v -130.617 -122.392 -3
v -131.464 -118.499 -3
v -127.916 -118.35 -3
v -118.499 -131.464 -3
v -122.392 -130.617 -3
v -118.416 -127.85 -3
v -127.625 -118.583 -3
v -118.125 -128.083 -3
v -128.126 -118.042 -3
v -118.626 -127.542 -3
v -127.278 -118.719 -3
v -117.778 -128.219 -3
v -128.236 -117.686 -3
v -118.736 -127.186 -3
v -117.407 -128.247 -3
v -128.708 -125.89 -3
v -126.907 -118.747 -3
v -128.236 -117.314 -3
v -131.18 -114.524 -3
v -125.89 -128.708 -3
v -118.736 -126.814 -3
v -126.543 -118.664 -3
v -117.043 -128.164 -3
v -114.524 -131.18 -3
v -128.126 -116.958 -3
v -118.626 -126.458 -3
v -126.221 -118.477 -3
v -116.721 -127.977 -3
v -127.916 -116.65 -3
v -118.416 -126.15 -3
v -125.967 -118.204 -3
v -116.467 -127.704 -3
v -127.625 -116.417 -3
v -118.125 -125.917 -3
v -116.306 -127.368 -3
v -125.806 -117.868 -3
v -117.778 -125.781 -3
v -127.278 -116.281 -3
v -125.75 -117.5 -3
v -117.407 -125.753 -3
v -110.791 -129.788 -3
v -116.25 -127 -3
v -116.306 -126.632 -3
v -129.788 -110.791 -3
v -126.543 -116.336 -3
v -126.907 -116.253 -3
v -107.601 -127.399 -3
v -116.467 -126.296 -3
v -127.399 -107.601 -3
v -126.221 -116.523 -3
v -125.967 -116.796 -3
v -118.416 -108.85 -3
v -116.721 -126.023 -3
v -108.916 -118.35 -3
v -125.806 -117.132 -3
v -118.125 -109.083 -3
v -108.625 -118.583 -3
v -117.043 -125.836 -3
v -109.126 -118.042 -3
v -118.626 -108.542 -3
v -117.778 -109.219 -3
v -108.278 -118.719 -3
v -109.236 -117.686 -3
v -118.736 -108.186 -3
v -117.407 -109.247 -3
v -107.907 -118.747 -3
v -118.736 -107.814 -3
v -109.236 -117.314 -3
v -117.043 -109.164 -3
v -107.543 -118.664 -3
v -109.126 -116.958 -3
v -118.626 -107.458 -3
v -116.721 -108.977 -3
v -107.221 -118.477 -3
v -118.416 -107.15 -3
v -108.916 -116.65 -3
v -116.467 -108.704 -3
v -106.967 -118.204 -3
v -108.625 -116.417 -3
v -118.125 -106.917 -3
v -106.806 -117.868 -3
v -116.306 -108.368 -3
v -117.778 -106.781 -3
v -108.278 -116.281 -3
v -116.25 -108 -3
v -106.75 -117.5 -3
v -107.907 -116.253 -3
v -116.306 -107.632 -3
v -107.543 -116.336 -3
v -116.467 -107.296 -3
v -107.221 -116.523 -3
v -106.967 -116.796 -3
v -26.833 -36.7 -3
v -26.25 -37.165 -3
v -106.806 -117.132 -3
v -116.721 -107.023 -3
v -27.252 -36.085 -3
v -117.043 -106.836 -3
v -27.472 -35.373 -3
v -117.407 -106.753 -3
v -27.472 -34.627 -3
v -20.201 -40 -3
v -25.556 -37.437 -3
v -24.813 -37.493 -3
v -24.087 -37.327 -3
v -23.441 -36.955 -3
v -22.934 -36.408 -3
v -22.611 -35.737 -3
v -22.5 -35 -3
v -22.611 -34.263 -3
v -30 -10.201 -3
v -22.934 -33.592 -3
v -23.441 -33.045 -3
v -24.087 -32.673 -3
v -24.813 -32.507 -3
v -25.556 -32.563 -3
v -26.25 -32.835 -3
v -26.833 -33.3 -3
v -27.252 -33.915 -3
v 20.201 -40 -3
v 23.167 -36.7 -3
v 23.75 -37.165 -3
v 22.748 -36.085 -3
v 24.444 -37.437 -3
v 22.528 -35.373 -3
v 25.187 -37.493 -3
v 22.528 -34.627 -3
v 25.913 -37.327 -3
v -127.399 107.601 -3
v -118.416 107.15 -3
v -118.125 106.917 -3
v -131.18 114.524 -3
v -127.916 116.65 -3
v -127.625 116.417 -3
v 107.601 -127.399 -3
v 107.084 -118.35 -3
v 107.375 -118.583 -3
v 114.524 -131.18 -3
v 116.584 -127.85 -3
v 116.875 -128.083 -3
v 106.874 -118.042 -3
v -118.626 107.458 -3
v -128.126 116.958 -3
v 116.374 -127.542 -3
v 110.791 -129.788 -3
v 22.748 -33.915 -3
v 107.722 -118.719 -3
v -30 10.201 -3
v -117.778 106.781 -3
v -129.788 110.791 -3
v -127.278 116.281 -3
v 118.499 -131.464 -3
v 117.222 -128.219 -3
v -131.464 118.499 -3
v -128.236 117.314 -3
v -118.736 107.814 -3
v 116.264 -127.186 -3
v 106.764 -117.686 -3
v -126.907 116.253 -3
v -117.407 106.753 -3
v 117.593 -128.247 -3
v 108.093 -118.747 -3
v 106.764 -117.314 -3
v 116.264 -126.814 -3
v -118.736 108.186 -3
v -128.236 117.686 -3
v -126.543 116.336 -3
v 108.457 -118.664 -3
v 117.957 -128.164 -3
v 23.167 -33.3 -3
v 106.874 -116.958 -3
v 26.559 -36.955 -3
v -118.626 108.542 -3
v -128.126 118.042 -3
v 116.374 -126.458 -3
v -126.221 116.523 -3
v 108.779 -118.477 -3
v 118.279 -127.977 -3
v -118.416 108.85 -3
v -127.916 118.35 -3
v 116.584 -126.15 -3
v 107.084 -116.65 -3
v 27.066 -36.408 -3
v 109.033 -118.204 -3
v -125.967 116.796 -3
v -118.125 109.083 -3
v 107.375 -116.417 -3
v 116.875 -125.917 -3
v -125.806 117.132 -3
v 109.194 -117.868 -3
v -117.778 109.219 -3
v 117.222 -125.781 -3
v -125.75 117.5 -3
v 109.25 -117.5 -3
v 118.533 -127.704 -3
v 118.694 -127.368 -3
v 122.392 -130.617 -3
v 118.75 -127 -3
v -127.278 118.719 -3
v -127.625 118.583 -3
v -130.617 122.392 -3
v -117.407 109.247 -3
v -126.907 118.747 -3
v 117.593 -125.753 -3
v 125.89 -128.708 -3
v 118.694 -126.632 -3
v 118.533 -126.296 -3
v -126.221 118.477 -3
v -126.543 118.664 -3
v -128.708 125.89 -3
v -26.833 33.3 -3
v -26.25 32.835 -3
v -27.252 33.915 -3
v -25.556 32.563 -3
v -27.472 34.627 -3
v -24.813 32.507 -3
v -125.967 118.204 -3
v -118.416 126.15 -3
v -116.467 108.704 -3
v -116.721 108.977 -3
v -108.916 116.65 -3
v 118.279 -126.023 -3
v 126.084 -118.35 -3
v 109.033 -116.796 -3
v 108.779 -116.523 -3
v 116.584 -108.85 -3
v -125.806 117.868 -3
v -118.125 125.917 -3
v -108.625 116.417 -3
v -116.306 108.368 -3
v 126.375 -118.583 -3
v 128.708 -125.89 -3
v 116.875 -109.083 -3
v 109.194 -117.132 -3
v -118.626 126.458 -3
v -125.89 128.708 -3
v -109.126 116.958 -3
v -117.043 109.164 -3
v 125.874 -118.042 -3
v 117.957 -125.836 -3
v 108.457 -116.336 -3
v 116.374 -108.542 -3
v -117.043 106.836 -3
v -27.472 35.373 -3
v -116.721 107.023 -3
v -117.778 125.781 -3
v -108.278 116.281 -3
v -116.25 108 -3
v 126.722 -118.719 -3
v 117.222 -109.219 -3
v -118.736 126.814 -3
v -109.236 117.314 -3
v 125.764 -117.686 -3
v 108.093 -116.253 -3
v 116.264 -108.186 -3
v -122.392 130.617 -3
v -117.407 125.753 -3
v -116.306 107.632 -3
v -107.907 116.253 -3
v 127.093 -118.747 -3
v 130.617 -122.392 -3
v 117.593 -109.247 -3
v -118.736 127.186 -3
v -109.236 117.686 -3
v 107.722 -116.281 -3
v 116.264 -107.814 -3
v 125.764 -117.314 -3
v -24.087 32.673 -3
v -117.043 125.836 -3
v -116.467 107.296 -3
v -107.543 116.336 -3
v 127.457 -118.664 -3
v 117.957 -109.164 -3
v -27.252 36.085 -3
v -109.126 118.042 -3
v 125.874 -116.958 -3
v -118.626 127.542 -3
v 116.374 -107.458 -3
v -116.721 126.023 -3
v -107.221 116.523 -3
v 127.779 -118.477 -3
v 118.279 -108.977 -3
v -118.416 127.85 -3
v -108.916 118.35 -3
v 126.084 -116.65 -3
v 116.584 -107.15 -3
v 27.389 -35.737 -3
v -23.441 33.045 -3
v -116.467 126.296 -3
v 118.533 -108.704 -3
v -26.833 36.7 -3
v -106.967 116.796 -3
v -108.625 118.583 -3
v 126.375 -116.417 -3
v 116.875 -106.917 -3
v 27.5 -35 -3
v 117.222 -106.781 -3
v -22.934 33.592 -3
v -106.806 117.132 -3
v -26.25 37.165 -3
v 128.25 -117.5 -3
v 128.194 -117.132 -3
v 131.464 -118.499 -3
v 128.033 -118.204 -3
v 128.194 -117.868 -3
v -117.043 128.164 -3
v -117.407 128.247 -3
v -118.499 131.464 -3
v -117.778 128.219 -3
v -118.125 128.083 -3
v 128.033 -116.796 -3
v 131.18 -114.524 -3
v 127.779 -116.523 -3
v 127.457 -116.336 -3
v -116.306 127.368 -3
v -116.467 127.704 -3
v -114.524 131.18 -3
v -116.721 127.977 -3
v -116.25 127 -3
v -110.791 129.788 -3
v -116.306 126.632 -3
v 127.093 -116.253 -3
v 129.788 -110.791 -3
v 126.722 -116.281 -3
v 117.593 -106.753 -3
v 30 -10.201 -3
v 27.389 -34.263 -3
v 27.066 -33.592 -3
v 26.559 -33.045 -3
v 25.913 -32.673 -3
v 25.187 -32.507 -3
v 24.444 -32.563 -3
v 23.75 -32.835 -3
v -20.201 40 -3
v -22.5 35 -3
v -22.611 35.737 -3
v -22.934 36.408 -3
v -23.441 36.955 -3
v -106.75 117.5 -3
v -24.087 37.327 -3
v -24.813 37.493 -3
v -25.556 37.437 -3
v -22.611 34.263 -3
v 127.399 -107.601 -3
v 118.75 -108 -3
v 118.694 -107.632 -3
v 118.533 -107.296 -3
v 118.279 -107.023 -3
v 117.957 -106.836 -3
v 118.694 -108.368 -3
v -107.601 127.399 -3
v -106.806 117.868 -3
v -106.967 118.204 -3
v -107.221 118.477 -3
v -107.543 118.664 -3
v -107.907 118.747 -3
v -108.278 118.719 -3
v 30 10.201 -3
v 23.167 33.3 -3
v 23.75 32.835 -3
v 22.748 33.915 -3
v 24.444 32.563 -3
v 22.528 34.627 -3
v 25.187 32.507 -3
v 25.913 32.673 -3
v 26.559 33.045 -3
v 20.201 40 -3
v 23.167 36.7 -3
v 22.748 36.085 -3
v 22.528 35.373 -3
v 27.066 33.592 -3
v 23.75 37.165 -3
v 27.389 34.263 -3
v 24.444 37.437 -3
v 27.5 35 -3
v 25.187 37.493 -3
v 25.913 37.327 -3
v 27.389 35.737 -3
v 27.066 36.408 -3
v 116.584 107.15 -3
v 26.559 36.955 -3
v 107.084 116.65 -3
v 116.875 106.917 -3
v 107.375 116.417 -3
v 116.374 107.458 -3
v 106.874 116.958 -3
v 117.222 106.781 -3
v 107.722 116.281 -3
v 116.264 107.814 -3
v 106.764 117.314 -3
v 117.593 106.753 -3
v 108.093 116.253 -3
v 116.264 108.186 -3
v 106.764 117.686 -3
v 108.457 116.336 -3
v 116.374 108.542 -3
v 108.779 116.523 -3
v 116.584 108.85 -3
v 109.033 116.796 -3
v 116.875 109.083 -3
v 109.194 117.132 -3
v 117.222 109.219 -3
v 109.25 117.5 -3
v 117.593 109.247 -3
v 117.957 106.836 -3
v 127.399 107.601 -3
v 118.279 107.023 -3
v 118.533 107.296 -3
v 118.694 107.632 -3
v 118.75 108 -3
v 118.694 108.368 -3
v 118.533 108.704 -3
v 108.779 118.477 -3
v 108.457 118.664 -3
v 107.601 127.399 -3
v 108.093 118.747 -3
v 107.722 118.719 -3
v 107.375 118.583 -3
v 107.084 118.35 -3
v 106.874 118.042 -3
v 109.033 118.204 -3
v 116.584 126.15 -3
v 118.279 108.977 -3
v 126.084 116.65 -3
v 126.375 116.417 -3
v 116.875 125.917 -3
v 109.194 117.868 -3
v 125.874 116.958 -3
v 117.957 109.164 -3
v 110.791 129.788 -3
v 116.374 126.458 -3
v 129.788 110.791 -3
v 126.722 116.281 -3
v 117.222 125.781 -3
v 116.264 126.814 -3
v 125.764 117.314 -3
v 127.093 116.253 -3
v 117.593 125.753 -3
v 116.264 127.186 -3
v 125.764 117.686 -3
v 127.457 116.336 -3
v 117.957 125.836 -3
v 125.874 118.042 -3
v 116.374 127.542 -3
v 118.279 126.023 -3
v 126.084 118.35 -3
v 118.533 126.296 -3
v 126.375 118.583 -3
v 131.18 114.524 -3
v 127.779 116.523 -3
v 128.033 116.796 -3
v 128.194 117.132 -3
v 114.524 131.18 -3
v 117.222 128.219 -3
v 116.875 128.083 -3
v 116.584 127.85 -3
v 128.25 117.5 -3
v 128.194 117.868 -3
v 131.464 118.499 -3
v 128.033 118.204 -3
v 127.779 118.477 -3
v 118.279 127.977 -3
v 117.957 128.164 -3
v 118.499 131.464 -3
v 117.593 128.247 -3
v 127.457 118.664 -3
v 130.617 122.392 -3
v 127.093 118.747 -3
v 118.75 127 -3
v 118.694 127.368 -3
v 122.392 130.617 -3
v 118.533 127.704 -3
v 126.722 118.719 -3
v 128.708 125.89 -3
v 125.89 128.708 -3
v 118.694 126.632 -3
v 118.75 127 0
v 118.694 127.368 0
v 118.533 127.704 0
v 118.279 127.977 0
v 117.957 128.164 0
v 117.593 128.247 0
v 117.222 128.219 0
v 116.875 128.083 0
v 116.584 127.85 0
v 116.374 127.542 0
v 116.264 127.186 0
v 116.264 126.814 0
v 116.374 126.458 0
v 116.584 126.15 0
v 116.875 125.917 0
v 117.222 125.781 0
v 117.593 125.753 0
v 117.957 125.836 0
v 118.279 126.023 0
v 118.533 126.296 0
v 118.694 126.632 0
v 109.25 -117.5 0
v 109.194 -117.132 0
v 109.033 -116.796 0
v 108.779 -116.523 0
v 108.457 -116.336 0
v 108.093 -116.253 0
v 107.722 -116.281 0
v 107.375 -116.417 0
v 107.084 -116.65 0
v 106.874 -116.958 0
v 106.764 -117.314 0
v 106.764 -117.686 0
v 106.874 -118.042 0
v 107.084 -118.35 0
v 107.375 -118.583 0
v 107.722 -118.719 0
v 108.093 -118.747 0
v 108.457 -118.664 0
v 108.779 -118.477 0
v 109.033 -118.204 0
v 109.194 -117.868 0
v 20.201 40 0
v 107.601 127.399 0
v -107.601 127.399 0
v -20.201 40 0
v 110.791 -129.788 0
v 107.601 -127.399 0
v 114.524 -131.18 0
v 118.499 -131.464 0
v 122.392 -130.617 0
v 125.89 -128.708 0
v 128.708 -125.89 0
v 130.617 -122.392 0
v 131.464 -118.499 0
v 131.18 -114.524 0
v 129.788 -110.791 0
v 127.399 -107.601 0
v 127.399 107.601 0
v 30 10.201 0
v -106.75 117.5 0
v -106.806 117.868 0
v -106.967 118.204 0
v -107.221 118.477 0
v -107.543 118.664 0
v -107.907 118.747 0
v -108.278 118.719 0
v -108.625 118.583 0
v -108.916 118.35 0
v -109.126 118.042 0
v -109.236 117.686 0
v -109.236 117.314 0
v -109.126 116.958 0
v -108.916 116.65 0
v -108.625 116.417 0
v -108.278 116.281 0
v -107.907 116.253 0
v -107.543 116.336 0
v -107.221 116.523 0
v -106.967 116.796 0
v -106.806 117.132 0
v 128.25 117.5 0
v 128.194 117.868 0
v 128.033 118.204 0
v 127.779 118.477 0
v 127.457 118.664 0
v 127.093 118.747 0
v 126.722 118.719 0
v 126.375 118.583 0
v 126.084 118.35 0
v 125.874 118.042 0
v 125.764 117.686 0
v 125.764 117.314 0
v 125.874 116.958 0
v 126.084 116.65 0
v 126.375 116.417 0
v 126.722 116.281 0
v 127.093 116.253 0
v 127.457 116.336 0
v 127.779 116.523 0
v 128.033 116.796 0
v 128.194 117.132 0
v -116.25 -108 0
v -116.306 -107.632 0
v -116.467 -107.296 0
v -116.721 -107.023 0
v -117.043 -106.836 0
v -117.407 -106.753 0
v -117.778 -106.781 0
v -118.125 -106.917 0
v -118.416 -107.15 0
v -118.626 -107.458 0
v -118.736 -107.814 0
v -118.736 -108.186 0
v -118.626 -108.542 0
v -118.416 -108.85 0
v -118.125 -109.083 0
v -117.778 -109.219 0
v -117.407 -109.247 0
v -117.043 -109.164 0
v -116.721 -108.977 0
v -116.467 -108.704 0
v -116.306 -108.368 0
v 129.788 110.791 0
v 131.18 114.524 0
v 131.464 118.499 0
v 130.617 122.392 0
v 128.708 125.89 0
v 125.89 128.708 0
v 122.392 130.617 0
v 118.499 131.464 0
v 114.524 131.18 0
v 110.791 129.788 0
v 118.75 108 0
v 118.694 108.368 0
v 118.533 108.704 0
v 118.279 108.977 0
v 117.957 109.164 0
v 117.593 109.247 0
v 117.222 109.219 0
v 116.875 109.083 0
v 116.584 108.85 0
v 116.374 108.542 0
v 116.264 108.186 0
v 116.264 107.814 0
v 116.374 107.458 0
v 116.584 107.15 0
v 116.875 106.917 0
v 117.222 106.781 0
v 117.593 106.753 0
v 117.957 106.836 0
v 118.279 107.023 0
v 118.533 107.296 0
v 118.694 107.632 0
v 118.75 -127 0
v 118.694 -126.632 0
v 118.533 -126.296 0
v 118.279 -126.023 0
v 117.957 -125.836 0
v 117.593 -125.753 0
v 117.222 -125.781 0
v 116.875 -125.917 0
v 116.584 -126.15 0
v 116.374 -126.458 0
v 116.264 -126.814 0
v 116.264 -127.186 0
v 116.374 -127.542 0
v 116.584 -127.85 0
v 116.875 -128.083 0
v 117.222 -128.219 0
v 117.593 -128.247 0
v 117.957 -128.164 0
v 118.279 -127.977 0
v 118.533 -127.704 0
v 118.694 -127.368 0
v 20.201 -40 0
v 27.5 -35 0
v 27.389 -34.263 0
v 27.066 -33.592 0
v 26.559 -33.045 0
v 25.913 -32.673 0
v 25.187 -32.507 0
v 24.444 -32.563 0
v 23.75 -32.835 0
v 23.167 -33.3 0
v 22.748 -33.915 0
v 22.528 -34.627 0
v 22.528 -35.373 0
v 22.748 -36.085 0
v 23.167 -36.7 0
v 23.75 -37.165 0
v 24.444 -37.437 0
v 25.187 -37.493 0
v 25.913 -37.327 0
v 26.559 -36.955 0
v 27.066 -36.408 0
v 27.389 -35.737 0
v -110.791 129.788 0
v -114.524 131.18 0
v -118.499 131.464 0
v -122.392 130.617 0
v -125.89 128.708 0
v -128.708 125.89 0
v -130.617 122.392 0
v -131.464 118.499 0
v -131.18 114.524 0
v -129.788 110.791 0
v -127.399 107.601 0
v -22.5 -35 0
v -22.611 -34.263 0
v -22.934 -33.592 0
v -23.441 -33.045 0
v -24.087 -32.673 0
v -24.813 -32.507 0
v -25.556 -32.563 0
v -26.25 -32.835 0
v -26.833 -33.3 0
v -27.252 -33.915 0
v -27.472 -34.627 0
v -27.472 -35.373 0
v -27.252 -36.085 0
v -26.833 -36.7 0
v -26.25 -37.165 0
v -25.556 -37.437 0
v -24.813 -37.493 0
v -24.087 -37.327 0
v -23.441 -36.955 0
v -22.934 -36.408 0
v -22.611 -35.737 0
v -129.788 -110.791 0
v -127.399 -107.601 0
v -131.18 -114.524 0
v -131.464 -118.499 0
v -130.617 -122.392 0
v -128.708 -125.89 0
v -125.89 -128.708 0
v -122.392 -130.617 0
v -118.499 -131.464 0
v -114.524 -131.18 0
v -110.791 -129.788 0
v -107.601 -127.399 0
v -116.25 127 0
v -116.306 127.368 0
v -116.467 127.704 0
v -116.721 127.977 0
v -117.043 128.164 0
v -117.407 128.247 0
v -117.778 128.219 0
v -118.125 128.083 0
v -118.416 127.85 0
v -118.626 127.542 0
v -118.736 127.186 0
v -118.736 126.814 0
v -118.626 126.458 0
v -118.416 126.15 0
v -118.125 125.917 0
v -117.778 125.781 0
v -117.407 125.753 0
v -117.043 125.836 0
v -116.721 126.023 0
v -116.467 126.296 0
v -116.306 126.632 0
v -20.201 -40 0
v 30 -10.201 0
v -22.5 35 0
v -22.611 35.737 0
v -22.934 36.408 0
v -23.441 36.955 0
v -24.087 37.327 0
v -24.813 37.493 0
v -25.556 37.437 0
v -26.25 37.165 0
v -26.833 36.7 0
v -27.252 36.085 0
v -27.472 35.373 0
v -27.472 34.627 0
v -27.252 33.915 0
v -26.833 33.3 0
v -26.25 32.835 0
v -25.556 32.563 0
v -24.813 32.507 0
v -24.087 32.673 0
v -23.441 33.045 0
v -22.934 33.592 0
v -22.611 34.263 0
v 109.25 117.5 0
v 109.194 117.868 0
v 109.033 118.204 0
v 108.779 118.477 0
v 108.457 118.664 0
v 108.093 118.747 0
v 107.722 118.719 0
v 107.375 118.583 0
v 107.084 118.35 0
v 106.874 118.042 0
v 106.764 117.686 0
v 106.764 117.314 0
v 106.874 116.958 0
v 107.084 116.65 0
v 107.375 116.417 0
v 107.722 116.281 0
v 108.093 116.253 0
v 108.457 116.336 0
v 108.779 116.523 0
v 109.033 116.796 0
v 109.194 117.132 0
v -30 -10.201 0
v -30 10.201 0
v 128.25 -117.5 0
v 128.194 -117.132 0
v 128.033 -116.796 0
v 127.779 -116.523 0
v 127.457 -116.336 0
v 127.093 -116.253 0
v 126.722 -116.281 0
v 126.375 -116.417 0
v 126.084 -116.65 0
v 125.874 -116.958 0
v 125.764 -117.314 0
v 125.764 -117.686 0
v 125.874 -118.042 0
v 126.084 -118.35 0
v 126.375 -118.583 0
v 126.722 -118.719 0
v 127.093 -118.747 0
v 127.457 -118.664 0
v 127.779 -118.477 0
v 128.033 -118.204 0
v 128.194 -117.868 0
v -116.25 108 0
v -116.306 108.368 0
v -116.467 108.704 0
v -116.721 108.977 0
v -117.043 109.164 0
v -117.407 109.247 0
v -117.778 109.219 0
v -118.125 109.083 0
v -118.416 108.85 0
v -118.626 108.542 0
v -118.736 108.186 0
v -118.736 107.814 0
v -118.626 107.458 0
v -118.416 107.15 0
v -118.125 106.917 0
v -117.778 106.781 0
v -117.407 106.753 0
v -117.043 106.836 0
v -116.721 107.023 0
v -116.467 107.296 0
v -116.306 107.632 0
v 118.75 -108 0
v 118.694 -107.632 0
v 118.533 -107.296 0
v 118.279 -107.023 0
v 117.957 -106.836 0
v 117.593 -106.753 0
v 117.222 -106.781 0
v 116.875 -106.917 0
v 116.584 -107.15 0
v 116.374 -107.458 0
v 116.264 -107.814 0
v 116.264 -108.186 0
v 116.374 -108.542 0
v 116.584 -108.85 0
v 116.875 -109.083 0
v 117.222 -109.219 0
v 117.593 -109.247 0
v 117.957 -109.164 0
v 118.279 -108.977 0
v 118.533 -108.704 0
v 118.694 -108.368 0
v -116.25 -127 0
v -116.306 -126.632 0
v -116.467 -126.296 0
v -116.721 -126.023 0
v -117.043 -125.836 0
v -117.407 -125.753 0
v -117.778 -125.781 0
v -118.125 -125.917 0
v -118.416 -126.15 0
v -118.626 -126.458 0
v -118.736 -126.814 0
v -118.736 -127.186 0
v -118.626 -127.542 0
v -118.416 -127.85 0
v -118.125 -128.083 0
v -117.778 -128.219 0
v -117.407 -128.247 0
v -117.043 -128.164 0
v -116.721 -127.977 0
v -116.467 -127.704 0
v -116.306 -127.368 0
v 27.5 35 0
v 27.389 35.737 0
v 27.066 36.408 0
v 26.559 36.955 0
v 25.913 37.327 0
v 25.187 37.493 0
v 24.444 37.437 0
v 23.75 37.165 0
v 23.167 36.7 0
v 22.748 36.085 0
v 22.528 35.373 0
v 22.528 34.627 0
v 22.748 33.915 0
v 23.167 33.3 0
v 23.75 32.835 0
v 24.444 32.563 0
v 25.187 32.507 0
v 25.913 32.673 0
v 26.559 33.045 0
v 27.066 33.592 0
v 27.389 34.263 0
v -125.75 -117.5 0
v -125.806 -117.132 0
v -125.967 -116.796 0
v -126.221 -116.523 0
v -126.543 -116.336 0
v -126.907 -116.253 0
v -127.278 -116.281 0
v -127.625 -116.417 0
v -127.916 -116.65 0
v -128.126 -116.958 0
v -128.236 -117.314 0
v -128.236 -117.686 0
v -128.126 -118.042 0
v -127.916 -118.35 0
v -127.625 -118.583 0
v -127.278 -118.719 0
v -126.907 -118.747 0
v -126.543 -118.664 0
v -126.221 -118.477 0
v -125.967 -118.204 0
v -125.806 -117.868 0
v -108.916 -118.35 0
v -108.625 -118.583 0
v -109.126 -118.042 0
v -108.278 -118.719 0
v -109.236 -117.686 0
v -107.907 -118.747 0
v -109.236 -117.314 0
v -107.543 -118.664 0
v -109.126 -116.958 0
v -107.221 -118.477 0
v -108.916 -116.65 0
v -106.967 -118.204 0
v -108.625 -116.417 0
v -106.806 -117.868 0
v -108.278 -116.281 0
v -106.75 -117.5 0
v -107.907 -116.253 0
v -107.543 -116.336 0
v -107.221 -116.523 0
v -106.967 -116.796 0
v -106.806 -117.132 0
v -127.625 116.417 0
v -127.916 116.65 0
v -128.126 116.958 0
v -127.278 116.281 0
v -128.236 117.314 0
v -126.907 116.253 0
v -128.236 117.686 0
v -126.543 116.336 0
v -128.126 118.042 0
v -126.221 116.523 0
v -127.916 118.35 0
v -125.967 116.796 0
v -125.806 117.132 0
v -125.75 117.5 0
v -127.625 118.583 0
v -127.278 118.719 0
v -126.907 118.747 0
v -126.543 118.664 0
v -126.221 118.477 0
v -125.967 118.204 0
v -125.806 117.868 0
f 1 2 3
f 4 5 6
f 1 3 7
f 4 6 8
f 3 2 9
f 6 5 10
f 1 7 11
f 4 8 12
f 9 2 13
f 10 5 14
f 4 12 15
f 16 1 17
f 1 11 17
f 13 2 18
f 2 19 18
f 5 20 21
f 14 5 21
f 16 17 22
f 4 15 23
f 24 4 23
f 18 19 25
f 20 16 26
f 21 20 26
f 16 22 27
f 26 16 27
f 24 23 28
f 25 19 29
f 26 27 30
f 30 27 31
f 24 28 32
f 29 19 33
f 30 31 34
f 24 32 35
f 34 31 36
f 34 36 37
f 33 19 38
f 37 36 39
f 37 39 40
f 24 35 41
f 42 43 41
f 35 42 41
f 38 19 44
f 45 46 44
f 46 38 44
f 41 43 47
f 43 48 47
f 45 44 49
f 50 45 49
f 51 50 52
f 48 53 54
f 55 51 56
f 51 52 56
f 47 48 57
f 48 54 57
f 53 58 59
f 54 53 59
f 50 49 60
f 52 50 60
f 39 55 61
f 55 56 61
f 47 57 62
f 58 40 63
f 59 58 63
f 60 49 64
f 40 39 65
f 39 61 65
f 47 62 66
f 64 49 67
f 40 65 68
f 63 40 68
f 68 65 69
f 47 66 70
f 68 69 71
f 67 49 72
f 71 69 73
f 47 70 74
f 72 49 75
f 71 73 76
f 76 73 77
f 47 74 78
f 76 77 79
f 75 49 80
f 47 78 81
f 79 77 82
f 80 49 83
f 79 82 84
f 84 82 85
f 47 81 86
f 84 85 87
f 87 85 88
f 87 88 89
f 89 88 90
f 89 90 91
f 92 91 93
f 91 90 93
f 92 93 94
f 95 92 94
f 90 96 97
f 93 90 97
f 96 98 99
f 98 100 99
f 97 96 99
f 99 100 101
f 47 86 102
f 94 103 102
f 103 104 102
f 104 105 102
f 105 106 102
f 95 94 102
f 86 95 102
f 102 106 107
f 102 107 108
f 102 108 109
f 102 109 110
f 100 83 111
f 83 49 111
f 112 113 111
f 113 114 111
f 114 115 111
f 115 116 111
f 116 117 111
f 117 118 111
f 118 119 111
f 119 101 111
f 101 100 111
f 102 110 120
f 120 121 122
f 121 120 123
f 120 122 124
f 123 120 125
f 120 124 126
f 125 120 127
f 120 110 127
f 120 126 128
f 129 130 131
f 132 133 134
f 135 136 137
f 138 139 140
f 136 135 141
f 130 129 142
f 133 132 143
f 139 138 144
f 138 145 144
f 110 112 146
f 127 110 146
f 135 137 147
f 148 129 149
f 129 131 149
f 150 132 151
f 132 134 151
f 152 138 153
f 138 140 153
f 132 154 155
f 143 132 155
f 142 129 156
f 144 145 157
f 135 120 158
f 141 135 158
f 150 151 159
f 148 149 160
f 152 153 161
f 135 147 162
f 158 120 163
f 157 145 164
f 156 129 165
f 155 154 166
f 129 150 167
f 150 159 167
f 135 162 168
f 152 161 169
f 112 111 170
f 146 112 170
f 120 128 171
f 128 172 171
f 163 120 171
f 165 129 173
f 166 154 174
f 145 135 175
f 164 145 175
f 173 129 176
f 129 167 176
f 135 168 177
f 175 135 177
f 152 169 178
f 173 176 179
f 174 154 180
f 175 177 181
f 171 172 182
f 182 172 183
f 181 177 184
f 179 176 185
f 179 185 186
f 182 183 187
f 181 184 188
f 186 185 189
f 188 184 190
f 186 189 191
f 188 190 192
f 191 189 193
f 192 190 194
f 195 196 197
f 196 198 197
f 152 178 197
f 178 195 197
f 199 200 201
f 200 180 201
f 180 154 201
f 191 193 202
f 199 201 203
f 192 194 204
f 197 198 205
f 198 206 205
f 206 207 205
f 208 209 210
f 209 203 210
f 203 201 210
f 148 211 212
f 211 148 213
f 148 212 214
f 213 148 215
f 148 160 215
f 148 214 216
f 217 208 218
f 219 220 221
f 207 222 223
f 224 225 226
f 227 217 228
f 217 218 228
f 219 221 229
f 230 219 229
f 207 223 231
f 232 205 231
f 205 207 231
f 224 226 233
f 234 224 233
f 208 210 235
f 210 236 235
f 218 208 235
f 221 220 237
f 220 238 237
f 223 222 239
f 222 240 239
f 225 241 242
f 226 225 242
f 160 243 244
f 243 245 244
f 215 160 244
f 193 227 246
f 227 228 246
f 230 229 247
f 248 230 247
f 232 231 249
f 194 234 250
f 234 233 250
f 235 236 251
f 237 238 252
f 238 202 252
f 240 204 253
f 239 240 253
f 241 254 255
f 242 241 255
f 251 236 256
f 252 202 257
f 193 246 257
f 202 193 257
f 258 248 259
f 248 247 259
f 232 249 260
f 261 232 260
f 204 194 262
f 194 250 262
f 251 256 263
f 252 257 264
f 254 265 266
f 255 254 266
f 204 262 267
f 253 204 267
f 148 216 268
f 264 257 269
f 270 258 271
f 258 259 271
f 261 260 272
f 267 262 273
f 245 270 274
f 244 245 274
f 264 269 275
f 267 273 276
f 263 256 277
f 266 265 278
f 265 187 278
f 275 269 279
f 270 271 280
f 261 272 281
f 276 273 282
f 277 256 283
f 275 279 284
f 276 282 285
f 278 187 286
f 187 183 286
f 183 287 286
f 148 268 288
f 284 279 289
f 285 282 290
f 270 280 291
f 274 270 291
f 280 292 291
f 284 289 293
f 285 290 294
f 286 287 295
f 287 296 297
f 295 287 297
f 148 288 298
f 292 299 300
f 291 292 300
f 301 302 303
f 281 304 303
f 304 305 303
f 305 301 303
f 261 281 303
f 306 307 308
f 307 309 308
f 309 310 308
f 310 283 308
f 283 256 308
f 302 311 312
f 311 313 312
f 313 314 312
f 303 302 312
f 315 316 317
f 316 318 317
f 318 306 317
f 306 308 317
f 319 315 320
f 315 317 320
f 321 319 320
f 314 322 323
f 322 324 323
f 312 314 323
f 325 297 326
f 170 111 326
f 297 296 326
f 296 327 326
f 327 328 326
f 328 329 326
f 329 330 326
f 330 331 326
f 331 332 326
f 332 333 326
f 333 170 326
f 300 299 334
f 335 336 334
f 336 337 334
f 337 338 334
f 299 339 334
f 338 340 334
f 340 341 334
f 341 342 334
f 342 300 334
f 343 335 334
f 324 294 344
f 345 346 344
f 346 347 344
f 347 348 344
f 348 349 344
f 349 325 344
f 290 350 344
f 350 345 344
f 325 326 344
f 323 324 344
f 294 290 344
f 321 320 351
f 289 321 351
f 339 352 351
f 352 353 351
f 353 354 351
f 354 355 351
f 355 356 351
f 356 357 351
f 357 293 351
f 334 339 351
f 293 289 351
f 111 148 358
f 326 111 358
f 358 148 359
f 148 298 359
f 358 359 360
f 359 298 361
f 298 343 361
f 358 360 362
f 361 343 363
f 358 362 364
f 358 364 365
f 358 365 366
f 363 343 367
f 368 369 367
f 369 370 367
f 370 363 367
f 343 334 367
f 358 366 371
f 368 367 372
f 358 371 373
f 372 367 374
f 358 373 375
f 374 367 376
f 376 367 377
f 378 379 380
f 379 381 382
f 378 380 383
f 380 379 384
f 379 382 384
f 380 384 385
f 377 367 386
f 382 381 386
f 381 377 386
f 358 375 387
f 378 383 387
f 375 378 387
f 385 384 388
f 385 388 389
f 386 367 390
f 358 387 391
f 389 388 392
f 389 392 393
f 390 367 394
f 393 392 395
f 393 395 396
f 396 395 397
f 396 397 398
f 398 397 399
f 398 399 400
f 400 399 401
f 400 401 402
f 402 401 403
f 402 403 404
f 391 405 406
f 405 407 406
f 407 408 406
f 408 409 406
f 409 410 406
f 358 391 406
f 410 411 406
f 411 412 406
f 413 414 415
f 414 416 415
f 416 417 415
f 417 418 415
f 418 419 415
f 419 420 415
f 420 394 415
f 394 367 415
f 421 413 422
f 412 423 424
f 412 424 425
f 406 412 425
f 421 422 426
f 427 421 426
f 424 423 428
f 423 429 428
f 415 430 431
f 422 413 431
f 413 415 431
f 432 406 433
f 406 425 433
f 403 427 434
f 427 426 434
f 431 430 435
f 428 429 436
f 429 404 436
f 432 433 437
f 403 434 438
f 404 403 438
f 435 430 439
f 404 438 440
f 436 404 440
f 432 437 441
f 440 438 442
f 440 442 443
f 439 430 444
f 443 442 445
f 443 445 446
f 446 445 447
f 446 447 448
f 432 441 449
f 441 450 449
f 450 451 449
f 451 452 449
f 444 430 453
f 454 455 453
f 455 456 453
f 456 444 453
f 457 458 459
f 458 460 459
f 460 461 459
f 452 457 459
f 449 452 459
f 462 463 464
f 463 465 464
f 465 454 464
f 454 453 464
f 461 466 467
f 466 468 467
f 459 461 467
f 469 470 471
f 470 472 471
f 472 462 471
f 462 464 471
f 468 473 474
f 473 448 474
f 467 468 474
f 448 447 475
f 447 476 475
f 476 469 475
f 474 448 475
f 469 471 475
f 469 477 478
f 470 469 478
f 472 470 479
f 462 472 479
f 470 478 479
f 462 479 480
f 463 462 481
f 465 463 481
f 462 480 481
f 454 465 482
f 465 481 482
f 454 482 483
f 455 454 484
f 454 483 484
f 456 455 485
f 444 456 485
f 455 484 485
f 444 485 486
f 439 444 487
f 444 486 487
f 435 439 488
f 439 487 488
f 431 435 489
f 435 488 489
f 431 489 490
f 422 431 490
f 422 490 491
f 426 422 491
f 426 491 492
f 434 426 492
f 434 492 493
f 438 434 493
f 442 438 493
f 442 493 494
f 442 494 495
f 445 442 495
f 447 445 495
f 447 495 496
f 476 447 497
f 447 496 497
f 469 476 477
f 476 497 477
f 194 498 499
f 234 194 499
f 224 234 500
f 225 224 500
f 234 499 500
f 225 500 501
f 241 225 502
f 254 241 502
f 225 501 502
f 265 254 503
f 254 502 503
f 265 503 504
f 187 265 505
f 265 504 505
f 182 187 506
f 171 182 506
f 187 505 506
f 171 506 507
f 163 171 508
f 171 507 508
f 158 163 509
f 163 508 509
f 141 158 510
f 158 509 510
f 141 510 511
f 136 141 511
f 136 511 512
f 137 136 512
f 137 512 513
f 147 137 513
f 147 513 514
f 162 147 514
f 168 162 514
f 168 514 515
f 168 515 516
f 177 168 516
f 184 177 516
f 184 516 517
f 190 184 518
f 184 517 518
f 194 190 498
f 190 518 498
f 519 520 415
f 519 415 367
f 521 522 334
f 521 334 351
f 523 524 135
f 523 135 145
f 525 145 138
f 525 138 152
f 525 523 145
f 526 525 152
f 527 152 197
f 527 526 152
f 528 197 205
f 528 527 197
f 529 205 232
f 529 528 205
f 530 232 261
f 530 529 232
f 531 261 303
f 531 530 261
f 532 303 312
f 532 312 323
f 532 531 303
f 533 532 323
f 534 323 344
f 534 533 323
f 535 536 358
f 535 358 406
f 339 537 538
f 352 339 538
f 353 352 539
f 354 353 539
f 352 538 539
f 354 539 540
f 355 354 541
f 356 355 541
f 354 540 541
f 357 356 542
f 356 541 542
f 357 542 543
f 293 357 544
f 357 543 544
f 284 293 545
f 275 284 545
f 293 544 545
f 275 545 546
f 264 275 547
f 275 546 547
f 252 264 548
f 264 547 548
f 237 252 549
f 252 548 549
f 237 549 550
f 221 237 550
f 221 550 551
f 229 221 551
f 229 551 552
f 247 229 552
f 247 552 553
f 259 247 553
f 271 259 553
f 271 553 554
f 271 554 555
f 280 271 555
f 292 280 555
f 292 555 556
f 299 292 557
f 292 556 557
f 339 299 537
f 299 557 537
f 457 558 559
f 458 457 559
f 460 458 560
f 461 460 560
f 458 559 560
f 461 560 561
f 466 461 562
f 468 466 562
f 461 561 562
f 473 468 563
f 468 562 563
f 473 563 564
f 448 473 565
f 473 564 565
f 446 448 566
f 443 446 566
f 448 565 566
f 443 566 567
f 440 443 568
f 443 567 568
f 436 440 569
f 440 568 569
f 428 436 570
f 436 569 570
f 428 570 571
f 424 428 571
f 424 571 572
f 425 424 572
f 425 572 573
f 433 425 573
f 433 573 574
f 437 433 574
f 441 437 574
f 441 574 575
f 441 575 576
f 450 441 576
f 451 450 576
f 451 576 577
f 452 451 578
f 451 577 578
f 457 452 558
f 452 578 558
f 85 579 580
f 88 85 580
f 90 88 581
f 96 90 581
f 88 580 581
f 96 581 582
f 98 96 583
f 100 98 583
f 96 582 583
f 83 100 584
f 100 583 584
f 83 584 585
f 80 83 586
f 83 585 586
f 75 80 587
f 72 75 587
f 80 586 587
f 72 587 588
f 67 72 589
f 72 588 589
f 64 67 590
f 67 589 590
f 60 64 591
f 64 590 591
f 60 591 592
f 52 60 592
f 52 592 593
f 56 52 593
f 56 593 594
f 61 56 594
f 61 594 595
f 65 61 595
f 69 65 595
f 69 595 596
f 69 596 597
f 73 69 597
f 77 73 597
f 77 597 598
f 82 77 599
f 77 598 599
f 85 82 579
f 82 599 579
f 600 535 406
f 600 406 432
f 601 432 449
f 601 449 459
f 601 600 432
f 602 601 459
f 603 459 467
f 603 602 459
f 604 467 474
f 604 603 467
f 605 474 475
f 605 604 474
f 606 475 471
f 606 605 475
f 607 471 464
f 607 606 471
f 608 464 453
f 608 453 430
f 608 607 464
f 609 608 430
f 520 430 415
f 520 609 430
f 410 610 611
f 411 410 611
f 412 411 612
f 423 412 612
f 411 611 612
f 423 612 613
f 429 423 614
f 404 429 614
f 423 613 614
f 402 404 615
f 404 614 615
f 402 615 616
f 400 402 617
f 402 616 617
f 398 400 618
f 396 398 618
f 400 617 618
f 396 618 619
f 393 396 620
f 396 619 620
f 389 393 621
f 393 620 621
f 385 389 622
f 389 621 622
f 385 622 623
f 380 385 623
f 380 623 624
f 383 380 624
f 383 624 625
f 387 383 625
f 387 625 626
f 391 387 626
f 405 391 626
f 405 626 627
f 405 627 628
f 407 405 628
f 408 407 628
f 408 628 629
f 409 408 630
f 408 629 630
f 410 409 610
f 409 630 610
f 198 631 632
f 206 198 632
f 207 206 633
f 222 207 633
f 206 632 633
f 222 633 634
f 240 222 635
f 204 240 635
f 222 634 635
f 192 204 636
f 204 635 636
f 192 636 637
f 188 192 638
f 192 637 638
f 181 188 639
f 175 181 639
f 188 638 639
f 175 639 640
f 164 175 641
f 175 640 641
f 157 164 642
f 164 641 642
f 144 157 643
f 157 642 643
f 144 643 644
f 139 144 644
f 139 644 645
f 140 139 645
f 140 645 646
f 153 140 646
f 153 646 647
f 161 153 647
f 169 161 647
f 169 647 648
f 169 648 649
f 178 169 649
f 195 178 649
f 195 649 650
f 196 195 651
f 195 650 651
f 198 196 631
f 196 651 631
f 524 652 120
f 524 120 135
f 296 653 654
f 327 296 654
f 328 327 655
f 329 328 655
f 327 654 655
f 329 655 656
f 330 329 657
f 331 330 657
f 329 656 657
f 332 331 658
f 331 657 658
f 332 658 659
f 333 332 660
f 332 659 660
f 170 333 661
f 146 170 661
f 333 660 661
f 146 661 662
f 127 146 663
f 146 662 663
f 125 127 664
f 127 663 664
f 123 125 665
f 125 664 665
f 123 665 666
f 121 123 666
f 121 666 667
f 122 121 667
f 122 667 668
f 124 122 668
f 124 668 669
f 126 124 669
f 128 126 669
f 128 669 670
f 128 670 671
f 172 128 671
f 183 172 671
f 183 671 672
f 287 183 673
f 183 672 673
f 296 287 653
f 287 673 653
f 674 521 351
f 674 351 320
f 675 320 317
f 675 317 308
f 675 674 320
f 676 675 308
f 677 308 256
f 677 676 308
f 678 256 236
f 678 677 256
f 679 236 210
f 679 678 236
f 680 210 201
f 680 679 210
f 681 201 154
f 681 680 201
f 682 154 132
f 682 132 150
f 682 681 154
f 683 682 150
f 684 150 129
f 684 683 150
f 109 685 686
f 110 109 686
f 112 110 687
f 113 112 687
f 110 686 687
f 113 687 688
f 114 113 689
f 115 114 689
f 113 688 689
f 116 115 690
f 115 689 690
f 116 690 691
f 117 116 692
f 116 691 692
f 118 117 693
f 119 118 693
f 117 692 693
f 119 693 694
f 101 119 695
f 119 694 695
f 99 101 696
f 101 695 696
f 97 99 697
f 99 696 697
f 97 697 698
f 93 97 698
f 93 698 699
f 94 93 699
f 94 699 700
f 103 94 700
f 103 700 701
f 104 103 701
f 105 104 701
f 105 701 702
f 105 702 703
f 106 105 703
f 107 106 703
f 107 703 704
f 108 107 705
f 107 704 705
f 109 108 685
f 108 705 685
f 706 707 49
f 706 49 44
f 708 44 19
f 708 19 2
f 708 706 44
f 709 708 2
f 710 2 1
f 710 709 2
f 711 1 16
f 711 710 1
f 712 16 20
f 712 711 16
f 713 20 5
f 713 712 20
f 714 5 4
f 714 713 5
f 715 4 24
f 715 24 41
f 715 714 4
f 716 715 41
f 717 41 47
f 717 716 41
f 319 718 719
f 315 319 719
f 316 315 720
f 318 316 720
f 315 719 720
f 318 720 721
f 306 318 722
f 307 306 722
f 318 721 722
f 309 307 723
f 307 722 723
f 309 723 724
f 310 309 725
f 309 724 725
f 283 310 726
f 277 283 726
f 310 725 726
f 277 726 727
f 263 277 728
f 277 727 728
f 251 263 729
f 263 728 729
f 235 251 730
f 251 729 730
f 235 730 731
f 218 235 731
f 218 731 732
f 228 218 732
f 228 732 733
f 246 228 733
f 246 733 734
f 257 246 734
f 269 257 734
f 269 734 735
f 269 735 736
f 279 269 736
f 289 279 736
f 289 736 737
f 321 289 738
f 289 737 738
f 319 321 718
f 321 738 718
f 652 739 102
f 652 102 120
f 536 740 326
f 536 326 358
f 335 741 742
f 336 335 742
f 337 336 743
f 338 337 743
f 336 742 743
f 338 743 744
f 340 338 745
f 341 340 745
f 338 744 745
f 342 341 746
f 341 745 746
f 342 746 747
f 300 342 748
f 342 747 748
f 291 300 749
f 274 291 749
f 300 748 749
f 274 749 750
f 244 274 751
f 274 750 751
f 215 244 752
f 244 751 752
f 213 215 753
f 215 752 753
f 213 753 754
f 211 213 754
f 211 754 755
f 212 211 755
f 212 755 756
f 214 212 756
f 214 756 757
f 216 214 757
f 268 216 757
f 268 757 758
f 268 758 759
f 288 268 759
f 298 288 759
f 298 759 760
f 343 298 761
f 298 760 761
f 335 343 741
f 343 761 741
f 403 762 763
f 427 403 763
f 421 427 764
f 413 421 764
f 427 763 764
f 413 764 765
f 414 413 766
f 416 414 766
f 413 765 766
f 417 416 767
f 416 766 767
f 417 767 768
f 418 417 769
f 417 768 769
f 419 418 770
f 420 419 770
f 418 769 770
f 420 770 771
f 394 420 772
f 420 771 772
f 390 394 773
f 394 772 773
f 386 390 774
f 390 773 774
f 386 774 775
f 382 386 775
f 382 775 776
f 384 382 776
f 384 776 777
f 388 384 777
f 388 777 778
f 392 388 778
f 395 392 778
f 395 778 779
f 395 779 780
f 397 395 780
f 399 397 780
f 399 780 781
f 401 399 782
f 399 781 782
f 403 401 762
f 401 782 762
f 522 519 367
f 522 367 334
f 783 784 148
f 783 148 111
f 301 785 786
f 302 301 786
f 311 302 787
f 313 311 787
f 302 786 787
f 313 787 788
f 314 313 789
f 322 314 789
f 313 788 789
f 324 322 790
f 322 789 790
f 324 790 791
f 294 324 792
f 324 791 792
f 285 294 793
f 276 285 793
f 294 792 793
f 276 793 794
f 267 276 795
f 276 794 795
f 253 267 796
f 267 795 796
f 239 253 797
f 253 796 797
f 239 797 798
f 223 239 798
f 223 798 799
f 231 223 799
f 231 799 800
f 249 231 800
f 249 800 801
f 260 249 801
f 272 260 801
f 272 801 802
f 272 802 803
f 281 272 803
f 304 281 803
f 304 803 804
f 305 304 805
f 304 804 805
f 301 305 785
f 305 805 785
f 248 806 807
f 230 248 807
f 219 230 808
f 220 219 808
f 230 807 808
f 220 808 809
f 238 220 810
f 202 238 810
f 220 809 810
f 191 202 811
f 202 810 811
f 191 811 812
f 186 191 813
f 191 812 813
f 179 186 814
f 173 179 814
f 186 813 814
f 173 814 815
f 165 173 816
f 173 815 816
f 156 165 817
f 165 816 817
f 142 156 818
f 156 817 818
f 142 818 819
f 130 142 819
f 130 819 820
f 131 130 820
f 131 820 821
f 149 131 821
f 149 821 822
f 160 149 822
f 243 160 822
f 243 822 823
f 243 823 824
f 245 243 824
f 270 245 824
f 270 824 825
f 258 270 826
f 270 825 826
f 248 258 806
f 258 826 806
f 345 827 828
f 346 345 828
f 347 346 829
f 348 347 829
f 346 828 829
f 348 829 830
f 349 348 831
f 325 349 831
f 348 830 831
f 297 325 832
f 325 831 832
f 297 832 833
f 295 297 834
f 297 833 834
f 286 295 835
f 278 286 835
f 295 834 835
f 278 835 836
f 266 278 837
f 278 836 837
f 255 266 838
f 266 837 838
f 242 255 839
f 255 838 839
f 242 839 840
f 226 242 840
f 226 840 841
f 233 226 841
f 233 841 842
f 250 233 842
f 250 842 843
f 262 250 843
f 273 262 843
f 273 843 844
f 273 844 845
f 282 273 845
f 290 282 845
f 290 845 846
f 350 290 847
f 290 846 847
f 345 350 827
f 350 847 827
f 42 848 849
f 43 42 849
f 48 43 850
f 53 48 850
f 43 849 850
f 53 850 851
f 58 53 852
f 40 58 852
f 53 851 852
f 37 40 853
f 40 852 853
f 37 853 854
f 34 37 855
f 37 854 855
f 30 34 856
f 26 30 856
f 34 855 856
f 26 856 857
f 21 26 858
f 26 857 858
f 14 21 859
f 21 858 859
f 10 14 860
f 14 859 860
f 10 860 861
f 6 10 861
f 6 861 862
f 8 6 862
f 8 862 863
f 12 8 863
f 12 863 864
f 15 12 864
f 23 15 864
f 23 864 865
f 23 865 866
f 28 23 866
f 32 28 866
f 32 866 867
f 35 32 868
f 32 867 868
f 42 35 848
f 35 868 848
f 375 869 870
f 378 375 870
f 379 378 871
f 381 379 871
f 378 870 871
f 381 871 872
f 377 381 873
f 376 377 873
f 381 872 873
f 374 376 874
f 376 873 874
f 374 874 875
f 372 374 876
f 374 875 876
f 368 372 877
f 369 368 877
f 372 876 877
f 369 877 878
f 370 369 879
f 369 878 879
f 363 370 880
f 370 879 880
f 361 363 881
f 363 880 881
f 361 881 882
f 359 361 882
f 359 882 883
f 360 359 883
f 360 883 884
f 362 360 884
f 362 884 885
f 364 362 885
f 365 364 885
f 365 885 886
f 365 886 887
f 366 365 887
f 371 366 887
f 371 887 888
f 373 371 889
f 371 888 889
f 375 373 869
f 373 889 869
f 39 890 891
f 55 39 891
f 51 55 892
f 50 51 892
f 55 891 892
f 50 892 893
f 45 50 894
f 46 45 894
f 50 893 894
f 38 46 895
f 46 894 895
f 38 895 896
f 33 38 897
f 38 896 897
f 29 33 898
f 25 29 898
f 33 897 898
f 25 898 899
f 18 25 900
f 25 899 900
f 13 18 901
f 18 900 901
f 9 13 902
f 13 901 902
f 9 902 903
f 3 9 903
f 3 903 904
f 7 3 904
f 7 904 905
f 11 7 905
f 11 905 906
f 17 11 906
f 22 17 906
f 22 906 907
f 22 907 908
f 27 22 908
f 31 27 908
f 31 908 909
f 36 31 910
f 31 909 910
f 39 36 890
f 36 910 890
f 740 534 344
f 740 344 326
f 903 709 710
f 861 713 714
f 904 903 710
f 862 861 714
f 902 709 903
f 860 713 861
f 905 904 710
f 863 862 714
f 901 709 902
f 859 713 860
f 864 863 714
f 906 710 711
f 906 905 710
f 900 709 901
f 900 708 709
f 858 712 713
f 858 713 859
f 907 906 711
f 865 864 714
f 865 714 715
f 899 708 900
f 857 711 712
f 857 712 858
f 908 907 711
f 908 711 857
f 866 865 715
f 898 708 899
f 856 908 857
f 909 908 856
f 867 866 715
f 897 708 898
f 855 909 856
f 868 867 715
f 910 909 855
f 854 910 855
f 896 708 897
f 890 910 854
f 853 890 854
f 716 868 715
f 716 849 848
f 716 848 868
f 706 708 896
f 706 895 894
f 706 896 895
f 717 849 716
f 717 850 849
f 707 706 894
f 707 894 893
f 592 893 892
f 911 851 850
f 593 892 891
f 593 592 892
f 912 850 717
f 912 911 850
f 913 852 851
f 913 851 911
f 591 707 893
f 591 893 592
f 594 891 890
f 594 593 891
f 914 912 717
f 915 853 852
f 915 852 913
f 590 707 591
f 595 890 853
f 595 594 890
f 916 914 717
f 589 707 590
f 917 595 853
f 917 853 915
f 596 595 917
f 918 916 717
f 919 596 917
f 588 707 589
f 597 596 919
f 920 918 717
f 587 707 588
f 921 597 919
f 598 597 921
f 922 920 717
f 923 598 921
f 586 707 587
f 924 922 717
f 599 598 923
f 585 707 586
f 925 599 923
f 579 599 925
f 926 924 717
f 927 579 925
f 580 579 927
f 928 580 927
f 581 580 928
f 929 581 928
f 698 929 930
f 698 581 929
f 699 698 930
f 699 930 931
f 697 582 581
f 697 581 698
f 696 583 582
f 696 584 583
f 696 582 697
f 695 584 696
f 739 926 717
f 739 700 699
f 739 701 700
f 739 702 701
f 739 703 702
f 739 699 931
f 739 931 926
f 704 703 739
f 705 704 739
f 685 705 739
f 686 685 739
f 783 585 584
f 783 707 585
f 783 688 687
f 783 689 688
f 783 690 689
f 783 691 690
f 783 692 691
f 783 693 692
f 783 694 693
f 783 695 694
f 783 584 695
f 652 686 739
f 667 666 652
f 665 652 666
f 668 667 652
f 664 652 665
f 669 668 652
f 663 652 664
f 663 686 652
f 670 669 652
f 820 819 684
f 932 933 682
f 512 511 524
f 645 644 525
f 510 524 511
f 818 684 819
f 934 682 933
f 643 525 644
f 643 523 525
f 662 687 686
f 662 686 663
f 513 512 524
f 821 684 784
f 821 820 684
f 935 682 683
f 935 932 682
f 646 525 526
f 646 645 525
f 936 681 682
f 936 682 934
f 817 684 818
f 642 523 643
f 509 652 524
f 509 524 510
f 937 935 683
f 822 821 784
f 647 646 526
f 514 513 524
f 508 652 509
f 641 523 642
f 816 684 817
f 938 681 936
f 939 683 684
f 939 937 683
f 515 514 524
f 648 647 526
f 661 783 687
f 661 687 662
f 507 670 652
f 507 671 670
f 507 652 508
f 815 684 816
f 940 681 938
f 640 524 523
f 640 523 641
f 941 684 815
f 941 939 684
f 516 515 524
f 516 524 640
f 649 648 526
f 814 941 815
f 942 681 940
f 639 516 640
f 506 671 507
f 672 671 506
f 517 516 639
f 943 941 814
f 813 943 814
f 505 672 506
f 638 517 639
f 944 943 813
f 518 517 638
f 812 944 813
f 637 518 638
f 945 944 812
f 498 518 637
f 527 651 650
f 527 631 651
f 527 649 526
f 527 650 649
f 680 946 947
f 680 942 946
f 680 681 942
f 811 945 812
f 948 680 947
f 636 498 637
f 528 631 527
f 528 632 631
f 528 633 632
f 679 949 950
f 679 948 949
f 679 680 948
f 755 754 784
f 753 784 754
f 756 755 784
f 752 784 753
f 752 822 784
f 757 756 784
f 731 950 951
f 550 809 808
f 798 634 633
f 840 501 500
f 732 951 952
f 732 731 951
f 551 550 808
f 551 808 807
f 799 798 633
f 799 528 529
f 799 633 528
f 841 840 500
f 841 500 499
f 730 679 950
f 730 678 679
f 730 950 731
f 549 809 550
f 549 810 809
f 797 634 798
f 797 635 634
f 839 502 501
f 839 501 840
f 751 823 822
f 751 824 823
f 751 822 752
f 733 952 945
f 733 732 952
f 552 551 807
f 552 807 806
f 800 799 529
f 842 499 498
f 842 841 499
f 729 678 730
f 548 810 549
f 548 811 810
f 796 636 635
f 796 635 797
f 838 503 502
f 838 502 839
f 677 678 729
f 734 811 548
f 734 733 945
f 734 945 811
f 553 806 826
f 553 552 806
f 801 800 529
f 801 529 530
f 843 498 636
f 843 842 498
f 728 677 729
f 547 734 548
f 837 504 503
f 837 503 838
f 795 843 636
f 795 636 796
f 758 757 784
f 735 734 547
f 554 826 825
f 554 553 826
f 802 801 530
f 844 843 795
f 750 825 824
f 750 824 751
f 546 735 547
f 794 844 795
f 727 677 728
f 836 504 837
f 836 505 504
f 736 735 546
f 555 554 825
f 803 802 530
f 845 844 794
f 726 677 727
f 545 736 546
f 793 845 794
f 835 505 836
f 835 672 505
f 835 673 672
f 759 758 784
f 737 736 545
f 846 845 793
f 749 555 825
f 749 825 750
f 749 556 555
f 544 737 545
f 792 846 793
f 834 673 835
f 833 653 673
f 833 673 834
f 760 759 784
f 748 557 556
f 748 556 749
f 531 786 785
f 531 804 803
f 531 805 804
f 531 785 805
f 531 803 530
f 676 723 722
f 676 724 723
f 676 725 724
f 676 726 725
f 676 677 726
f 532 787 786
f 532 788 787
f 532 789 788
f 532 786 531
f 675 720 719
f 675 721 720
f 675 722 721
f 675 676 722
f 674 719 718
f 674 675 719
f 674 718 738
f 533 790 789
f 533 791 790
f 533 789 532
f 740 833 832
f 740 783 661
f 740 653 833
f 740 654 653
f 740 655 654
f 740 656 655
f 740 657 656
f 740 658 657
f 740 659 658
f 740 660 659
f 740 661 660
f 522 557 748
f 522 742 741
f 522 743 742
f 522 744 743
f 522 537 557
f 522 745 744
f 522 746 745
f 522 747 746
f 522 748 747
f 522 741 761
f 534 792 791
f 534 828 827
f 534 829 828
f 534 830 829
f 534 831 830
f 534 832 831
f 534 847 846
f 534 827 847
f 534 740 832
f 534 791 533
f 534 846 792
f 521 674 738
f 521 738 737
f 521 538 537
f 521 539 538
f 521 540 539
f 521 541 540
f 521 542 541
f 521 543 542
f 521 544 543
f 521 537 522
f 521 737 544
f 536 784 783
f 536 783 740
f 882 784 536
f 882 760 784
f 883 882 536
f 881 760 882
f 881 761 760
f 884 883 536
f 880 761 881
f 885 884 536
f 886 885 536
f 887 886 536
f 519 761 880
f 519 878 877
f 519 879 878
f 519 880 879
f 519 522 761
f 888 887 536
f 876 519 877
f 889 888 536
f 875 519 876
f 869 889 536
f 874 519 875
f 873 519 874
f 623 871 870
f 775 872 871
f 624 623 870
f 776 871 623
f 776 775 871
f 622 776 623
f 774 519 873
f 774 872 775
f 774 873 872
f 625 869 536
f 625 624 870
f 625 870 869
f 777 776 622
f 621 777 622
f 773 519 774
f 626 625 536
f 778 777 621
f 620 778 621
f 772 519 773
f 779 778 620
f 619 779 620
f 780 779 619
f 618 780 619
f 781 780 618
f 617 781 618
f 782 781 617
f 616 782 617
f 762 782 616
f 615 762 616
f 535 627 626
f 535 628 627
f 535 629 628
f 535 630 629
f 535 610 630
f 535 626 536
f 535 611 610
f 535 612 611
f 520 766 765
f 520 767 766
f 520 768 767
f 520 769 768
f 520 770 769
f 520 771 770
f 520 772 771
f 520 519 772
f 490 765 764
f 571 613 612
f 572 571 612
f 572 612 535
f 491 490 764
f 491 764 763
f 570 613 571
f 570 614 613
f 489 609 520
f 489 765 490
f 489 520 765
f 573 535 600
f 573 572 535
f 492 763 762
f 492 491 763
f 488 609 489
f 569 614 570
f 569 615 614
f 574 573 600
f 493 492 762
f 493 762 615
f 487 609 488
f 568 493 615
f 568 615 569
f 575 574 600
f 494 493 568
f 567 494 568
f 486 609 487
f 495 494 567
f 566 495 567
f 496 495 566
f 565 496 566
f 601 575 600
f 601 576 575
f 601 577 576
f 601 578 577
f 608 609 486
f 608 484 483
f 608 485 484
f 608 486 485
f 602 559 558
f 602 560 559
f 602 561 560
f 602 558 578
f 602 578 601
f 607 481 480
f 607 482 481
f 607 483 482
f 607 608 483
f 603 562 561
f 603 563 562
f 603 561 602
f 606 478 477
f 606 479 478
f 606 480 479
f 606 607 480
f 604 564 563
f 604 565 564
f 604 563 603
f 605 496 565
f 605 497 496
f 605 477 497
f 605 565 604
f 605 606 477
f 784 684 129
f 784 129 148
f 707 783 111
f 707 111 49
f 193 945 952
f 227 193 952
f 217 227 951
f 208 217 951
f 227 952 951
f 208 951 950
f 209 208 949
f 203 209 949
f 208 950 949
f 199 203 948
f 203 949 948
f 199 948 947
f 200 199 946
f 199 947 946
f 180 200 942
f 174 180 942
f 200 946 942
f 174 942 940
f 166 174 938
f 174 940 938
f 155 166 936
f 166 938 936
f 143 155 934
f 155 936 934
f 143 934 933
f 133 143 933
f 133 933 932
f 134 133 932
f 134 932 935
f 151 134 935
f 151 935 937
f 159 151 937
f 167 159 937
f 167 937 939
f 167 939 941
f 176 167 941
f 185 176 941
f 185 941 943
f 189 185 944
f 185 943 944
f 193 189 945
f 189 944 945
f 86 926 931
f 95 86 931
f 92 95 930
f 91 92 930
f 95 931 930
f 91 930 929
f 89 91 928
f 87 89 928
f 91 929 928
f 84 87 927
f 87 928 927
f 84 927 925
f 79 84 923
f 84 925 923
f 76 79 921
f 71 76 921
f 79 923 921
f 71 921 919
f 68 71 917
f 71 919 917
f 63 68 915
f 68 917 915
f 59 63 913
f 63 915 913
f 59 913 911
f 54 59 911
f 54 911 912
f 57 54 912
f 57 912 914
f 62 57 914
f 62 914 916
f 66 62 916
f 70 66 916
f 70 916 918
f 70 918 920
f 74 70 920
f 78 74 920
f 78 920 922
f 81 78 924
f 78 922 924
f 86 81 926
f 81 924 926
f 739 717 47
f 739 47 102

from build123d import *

# Parameters (mm, degrees)
BOSS_EXTRUDE1_DEPTH = 3
SKETCH4_R           = 1.25
SKETCH4_R_2         = 2.5
CUT_EXTRUDE1_DEPTH  = 3


with BuildPart() as part:
    # Sketch1 → Boss-Extrude1 (new body)
    with BuildSketch(Plane.XY):
        with BuildLine():
            Line((20.201010127, 40), (-20.201010127, 40))
            Line((-20.201010127, 40), (-107.600505063, 127.399494937))
            ThreePointArc((-107.600505063, 127.399494937), (-127.399494937, 127.399494937), (-127.399494937, 107.600505063))
            Line((-127.399494937, 107.600505063), (-30, 10.201010127))
            Line((-30, 10.201010127), (-30, -10.201010127))
            Line((-30, -10.201010127), (-127.399494937, -107.600505063))
            ThreePointArc((-127.399494937, -107.600505063), (-127.399494937, -127.399494937), (-107.600505063, -127.399494937))
            Line((-107.600505063, -127.399494937), (-20.201010127, -40))
            Line((-20.201010127, -40), (20.201010127, -40))
            Line((20.201010127, -40), (107.600505063, -127.399494937))
            ThreePointArc((107.600505063, -127.399494937), (127.399494937, -127.399494937), (127.399494937, -107.600505063))
            Line((127.399494937, -107.600505063), (30, -10.201010127))
            Line((30, -10.201010127), (30, 10.201010127))
            Line((30, 10.201010127), (127.399494937, 107.600505063))
            ThreePointArc((127.399494937, 107.600505063), (127.399494937, 127.399494937), (107.600505063, 127.399494937))
            Line((107.600505063, 127.399494937), (20.201010127, 40))
        make_face()
    extrude(amount=-BOSS_EXTRUDE1_DEPTH)

    # Sketch4 → Cut-Extrude1 (cut)
    with BuildSketch(Plane.XY):
        with Locations((-108, 117.5)):
            Circle(SKETCH4_R)
        with Locations((-117.5, 108)):
            Circle(SKETCH4_R)
        with Locations((-127, 117.5)):
            Circle(SKETCH4_R)
        with Locations((-117.5, 127)):
            Circle(SKETCH4_R)
        with Locations((-25, 35)):
            Circle(SKETCH4_R_2)
        with Locations((-117.5, -108)):
            Circle(SKETCH4_R)
        with Locations((-127, -117.5)):
            Circle(SKETCH4_R)
        with Locations((-117.5, -127)):
            Circle(SKETCH4_R)
        with Locations((-108, -117.5)):
            Circle(SKETCH4_R)
        with Locations((-25, -35)):
            Circle(SKETCH4_R_2)
        with Locations((108, -117.5)):
            Circle(SKETCH4_R)
        with Locations((117.5, -127)):
            Circle(SKETCH4_R)
        with Locations((127, -117.5)):
            Circle(SKETCH4_R)
        with Locations((117.5, -108)):
            Circle(SKETCH4_R)
        with Locations((117.5, 108)):
            Circle(SKETCH4_R)
        with Locations((127, 117.5)):
            Circle(SKETCH4_R)
        with Locations((117.5, 127)):
            Circle(SKETCH4_R)
        with Locations((108, 117.5)):
            Circle(SKETCH4_R)
        with Locations((25, -35)):
            Circle(SKETCH4_R_2)
        with Locations((25, 35)):
            Circle(SKETCH4_R_2)
    extrude(amount=-CUT_EXTRUDE1_DEPTH, mode=Mode.SUBTRACT)


solid = part.part
